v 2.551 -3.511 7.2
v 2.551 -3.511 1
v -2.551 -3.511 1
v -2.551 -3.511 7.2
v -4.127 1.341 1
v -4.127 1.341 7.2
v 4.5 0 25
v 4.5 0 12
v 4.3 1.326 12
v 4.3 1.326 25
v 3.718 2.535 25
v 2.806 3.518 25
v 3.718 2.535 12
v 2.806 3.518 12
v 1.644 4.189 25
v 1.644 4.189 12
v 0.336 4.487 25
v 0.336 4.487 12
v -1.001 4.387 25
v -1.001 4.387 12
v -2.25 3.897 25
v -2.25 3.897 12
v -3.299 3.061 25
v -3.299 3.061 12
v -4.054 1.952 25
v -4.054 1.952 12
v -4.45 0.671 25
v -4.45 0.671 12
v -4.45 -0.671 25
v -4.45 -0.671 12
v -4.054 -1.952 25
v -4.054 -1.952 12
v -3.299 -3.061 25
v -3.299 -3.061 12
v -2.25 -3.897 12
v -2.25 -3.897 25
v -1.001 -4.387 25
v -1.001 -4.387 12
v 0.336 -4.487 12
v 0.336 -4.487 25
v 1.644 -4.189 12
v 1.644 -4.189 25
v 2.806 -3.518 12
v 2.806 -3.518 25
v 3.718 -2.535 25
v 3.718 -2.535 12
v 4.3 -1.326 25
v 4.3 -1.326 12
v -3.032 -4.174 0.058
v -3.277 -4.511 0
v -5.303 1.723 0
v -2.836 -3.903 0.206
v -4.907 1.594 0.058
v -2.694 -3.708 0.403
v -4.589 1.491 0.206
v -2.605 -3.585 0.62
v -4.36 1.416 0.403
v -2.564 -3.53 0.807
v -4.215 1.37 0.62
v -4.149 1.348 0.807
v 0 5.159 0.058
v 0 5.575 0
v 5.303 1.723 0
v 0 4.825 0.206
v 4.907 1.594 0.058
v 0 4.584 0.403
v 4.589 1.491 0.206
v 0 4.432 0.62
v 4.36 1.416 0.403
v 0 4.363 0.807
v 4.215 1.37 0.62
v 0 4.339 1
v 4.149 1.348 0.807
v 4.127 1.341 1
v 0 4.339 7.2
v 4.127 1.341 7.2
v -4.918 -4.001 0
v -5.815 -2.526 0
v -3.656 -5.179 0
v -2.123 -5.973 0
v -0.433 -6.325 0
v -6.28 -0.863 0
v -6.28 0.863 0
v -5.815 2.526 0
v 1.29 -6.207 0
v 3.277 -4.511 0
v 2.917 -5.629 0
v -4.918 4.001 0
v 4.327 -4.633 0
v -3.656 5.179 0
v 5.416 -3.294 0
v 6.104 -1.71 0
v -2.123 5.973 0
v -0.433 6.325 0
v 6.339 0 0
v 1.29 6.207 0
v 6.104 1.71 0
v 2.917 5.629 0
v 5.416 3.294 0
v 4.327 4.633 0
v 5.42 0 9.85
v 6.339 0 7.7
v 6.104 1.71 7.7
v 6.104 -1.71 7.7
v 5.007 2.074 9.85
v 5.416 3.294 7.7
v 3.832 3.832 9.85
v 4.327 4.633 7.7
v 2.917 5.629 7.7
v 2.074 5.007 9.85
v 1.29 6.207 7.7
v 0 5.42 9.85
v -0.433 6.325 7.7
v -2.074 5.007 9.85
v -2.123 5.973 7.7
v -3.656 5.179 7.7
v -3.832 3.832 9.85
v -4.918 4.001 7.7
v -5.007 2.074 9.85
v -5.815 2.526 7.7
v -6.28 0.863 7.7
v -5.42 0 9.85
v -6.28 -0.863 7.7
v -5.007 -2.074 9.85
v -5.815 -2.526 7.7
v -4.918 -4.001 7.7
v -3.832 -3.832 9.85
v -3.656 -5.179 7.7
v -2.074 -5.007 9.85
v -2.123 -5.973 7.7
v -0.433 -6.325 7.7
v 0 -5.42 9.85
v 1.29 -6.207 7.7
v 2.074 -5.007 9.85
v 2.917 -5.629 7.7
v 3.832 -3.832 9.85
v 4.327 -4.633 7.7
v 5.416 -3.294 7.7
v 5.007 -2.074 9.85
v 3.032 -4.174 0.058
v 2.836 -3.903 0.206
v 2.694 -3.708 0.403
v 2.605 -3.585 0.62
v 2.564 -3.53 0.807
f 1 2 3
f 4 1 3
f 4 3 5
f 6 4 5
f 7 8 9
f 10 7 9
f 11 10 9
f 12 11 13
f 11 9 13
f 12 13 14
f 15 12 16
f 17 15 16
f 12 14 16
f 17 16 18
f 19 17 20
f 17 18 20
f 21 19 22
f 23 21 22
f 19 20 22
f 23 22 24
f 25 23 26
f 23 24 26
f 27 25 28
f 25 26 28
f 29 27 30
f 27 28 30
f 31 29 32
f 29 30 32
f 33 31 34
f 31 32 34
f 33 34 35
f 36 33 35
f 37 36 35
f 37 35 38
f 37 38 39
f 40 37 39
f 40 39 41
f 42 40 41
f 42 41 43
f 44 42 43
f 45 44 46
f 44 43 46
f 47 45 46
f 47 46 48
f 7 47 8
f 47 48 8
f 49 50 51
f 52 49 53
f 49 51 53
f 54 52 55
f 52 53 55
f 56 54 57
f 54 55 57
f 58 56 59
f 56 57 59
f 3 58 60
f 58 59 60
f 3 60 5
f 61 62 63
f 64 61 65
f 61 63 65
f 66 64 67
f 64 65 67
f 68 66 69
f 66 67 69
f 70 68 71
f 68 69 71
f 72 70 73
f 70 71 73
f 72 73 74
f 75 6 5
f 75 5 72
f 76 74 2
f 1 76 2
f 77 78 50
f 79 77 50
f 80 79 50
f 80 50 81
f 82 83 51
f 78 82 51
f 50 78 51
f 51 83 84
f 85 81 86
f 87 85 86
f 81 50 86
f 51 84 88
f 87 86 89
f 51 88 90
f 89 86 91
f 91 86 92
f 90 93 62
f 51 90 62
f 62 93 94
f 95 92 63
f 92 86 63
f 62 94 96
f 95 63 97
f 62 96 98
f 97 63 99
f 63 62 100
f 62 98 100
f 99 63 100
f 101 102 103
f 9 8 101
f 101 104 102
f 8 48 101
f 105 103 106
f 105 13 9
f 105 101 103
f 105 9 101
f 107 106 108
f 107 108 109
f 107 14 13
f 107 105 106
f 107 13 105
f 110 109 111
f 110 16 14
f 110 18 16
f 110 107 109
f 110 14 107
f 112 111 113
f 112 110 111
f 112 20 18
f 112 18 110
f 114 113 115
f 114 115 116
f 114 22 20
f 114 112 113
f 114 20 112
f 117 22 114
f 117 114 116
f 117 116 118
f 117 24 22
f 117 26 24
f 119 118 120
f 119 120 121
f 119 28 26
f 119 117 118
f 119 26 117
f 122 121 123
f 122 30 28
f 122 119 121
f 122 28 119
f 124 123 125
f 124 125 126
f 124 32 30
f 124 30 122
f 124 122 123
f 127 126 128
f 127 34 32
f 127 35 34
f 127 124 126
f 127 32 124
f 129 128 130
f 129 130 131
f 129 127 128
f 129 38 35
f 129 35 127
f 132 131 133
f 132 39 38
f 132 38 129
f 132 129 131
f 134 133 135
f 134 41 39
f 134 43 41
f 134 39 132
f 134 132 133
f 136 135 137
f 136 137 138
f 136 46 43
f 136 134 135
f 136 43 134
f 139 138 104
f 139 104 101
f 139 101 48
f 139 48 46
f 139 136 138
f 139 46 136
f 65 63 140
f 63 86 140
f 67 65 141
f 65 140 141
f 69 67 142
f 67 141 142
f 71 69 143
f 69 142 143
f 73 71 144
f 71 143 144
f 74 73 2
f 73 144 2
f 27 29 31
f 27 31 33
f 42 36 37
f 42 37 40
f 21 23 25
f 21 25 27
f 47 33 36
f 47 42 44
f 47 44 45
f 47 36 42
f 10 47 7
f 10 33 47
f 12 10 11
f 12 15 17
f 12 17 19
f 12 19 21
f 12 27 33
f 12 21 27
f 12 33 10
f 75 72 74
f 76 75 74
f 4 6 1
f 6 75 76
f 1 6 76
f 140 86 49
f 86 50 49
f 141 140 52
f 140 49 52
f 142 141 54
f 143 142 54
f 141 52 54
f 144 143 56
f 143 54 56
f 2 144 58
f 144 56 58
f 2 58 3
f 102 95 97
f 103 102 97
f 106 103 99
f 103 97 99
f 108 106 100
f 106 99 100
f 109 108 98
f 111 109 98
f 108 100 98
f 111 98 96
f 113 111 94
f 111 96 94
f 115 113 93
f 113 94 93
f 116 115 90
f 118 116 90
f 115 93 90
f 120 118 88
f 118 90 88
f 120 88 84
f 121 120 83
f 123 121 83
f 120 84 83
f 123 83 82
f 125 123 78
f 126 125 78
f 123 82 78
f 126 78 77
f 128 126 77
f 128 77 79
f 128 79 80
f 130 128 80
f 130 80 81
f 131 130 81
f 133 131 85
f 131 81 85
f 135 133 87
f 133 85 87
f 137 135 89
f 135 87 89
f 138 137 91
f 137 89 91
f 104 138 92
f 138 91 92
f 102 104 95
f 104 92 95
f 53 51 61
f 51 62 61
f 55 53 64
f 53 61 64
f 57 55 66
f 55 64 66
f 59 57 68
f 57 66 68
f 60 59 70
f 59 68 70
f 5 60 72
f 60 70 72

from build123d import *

# Parameters (mm, degrees)
F0_R      = 6.3393732753
F1_DEPTH  = 7.2
F2_R      = 6.3393732753
F3_DEPTH  = 0.5
F3_FACE_R = 6.3393732753
F5_R      = 4.5
F7_DEPTH  = 13
F8_R      = 1


with BuildPart() as f1:
    # F0 (on Top) → F1 (new body)
    with BuildSketch(Plane.XY):
        Circle(F0_R)
        Polygon((-2.5506196154, -3.5106267247), (-4.1269892301, 1.340940087), (0, 4.3393732753), (4.1269892301, 1.340940087), (2.5506196154, -3.5106267247), align=None, mode=Mode.SUBTRACT)
    extrude(amount=F1_DEPTH)

    # F2 (on face) → F3 (join)
    with BuildSketch(Plane.XY.offset(7.2)):
        Circle(F2_R)
        Polygon((2.5506196154, -3.5106267247), (-2.5506196154, -3.5106267247), (-4.1269892301, 1.340940087), (0, 4.3393732753), (4.1269892301, 1.340940087), align=None, mode=Mode.SUBTRACT)
        Polygon((-4.1269892301, 1.340940087), (-2.5506196154, -3.5106267247), (2.5506196154, -3.5106267247), (4.1269892301, 1.340940087), (0, 4.3393732753), align=None)
    extrude(amount=F3_DEPTH)

    # F3_face (on face) → F6 section 0
    with BuildSketch(Plane.XY.offset(7.7)):
        Circle(F3_FACE_R)
    # F5 (on offset) → F6 section 1
    with BuildSketch(Plane.XY.offset(12)):
        Circle(F5_R)
    loft()

    # F7 (add): a face of the model
    f7_faces = [f1.faces().sort_by_distance(p)[0] for p in [
        (0, 0, 12),
    ]]
    extrude(f7_faces, amount=F7_DEPTH)

    # F8
    f8_edges = [f1.edges().sort_by_distance(p)[0] for p in [
        (-3.338804, -1.084843, 0),
        (0, -3.510627, 0),
        (3.338804, -1.084843, 0),
        (2.063495, 2.840157, 0),
        (-2.063495, 2.840157, 0),
    ]]
    fillet(f8_edges, radius=F8_R)


solid = f1.part
